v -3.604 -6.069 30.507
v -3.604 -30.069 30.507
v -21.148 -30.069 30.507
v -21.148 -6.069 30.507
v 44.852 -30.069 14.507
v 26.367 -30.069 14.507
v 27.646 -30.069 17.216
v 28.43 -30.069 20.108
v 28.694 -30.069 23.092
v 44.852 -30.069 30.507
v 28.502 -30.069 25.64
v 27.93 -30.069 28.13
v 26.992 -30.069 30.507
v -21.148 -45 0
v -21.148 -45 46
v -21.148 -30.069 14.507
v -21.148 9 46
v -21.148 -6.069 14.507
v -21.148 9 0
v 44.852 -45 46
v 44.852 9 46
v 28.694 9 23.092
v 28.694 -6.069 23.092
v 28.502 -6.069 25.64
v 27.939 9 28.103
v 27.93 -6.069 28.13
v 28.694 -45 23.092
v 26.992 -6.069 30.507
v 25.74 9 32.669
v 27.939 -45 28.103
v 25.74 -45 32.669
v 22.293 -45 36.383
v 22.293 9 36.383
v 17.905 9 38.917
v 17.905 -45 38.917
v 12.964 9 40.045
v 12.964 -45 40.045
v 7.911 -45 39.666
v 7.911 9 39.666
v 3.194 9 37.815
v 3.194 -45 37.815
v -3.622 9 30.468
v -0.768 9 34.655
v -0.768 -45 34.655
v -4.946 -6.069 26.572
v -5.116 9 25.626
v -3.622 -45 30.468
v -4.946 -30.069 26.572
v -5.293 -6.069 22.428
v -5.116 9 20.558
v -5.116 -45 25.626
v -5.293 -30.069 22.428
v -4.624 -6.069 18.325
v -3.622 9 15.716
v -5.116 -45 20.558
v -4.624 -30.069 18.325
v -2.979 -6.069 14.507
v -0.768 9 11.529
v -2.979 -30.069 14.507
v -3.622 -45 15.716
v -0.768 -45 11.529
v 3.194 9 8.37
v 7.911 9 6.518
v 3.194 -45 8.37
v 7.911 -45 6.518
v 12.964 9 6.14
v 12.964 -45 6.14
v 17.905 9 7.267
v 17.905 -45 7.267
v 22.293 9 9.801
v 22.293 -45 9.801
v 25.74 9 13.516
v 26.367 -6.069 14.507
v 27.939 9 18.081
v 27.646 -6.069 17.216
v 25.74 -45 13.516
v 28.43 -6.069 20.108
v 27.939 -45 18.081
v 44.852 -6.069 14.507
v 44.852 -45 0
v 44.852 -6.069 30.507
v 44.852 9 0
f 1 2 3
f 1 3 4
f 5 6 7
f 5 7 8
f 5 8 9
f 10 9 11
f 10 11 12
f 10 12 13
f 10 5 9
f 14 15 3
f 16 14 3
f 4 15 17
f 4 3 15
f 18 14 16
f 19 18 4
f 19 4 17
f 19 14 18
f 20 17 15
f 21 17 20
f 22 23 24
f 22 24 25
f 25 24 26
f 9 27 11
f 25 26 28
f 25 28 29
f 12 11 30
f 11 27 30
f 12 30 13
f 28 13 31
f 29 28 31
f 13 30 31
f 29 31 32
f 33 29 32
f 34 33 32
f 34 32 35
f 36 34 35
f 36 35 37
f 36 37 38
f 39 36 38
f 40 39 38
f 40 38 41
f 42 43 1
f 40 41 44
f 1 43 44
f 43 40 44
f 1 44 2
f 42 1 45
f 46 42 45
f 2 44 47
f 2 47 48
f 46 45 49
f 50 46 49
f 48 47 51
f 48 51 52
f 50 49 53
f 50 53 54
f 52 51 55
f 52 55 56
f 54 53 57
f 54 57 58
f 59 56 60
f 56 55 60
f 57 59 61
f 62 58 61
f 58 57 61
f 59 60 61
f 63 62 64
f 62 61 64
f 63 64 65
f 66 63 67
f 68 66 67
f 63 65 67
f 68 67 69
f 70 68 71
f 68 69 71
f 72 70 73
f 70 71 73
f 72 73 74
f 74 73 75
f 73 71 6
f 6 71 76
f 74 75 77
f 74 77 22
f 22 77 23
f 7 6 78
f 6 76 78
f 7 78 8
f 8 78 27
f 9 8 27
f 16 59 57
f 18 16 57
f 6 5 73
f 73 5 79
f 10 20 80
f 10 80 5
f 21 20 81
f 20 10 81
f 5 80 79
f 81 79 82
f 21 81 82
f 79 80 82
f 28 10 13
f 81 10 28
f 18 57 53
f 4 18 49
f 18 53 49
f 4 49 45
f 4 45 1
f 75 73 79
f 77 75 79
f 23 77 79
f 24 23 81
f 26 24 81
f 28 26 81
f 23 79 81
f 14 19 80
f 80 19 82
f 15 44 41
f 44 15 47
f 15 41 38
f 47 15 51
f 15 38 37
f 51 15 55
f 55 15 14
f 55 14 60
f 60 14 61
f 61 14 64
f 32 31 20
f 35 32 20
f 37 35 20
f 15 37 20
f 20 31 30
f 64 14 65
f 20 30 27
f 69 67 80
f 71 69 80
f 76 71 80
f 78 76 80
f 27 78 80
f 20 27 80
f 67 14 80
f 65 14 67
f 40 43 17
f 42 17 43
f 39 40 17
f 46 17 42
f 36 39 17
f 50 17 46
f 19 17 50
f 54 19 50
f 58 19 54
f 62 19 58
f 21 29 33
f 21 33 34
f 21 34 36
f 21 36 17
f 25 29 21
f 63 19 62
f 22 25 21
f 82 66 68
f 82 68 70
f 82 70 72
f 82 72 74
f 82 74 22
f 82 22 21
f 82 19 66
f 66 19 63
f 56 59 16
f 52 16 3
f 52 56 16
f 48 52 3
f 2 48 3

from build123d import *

# Parameters (mm, degrees)
F0_W     = 66
F0_H     = 54
F1_DEPTH = 46
F2_R     = 17
F3_DEPTH = 54
F4_W     = 24
F4_H     = 16
F5_DEPTH = 66


with BuildPart() as f1:
    # F0 (on Top) → F1 (new body)
    with BuildSketch(Plane.XY):
        with Locations((11.851974, -18.000006)):
            Rectangle(F0_W, F0_H)
    extrude(amount=F1_DEPTH)

    # F2 (on face) → F3 (cut)
    with BuildSketch(Plane.XZ.offset(45.000006)):
        with Locations((11.69408, 23.092108)):
            Circle(F2_R)
    extrude(amount=-F3_DEPTH, mode=Mode.SUBTRACT)

    # F4 (on face) → F5 (cut)
    with BuildSketch(Plane.YZ.offset(44.851974)):
        with Locations((-18.06908, 22.506579)):
            Rectangle(F4_W, F4_H)
    extrude(amount=-F5_DEPTH, mode=Mode.SUBTRACT)


solid = f1.part
